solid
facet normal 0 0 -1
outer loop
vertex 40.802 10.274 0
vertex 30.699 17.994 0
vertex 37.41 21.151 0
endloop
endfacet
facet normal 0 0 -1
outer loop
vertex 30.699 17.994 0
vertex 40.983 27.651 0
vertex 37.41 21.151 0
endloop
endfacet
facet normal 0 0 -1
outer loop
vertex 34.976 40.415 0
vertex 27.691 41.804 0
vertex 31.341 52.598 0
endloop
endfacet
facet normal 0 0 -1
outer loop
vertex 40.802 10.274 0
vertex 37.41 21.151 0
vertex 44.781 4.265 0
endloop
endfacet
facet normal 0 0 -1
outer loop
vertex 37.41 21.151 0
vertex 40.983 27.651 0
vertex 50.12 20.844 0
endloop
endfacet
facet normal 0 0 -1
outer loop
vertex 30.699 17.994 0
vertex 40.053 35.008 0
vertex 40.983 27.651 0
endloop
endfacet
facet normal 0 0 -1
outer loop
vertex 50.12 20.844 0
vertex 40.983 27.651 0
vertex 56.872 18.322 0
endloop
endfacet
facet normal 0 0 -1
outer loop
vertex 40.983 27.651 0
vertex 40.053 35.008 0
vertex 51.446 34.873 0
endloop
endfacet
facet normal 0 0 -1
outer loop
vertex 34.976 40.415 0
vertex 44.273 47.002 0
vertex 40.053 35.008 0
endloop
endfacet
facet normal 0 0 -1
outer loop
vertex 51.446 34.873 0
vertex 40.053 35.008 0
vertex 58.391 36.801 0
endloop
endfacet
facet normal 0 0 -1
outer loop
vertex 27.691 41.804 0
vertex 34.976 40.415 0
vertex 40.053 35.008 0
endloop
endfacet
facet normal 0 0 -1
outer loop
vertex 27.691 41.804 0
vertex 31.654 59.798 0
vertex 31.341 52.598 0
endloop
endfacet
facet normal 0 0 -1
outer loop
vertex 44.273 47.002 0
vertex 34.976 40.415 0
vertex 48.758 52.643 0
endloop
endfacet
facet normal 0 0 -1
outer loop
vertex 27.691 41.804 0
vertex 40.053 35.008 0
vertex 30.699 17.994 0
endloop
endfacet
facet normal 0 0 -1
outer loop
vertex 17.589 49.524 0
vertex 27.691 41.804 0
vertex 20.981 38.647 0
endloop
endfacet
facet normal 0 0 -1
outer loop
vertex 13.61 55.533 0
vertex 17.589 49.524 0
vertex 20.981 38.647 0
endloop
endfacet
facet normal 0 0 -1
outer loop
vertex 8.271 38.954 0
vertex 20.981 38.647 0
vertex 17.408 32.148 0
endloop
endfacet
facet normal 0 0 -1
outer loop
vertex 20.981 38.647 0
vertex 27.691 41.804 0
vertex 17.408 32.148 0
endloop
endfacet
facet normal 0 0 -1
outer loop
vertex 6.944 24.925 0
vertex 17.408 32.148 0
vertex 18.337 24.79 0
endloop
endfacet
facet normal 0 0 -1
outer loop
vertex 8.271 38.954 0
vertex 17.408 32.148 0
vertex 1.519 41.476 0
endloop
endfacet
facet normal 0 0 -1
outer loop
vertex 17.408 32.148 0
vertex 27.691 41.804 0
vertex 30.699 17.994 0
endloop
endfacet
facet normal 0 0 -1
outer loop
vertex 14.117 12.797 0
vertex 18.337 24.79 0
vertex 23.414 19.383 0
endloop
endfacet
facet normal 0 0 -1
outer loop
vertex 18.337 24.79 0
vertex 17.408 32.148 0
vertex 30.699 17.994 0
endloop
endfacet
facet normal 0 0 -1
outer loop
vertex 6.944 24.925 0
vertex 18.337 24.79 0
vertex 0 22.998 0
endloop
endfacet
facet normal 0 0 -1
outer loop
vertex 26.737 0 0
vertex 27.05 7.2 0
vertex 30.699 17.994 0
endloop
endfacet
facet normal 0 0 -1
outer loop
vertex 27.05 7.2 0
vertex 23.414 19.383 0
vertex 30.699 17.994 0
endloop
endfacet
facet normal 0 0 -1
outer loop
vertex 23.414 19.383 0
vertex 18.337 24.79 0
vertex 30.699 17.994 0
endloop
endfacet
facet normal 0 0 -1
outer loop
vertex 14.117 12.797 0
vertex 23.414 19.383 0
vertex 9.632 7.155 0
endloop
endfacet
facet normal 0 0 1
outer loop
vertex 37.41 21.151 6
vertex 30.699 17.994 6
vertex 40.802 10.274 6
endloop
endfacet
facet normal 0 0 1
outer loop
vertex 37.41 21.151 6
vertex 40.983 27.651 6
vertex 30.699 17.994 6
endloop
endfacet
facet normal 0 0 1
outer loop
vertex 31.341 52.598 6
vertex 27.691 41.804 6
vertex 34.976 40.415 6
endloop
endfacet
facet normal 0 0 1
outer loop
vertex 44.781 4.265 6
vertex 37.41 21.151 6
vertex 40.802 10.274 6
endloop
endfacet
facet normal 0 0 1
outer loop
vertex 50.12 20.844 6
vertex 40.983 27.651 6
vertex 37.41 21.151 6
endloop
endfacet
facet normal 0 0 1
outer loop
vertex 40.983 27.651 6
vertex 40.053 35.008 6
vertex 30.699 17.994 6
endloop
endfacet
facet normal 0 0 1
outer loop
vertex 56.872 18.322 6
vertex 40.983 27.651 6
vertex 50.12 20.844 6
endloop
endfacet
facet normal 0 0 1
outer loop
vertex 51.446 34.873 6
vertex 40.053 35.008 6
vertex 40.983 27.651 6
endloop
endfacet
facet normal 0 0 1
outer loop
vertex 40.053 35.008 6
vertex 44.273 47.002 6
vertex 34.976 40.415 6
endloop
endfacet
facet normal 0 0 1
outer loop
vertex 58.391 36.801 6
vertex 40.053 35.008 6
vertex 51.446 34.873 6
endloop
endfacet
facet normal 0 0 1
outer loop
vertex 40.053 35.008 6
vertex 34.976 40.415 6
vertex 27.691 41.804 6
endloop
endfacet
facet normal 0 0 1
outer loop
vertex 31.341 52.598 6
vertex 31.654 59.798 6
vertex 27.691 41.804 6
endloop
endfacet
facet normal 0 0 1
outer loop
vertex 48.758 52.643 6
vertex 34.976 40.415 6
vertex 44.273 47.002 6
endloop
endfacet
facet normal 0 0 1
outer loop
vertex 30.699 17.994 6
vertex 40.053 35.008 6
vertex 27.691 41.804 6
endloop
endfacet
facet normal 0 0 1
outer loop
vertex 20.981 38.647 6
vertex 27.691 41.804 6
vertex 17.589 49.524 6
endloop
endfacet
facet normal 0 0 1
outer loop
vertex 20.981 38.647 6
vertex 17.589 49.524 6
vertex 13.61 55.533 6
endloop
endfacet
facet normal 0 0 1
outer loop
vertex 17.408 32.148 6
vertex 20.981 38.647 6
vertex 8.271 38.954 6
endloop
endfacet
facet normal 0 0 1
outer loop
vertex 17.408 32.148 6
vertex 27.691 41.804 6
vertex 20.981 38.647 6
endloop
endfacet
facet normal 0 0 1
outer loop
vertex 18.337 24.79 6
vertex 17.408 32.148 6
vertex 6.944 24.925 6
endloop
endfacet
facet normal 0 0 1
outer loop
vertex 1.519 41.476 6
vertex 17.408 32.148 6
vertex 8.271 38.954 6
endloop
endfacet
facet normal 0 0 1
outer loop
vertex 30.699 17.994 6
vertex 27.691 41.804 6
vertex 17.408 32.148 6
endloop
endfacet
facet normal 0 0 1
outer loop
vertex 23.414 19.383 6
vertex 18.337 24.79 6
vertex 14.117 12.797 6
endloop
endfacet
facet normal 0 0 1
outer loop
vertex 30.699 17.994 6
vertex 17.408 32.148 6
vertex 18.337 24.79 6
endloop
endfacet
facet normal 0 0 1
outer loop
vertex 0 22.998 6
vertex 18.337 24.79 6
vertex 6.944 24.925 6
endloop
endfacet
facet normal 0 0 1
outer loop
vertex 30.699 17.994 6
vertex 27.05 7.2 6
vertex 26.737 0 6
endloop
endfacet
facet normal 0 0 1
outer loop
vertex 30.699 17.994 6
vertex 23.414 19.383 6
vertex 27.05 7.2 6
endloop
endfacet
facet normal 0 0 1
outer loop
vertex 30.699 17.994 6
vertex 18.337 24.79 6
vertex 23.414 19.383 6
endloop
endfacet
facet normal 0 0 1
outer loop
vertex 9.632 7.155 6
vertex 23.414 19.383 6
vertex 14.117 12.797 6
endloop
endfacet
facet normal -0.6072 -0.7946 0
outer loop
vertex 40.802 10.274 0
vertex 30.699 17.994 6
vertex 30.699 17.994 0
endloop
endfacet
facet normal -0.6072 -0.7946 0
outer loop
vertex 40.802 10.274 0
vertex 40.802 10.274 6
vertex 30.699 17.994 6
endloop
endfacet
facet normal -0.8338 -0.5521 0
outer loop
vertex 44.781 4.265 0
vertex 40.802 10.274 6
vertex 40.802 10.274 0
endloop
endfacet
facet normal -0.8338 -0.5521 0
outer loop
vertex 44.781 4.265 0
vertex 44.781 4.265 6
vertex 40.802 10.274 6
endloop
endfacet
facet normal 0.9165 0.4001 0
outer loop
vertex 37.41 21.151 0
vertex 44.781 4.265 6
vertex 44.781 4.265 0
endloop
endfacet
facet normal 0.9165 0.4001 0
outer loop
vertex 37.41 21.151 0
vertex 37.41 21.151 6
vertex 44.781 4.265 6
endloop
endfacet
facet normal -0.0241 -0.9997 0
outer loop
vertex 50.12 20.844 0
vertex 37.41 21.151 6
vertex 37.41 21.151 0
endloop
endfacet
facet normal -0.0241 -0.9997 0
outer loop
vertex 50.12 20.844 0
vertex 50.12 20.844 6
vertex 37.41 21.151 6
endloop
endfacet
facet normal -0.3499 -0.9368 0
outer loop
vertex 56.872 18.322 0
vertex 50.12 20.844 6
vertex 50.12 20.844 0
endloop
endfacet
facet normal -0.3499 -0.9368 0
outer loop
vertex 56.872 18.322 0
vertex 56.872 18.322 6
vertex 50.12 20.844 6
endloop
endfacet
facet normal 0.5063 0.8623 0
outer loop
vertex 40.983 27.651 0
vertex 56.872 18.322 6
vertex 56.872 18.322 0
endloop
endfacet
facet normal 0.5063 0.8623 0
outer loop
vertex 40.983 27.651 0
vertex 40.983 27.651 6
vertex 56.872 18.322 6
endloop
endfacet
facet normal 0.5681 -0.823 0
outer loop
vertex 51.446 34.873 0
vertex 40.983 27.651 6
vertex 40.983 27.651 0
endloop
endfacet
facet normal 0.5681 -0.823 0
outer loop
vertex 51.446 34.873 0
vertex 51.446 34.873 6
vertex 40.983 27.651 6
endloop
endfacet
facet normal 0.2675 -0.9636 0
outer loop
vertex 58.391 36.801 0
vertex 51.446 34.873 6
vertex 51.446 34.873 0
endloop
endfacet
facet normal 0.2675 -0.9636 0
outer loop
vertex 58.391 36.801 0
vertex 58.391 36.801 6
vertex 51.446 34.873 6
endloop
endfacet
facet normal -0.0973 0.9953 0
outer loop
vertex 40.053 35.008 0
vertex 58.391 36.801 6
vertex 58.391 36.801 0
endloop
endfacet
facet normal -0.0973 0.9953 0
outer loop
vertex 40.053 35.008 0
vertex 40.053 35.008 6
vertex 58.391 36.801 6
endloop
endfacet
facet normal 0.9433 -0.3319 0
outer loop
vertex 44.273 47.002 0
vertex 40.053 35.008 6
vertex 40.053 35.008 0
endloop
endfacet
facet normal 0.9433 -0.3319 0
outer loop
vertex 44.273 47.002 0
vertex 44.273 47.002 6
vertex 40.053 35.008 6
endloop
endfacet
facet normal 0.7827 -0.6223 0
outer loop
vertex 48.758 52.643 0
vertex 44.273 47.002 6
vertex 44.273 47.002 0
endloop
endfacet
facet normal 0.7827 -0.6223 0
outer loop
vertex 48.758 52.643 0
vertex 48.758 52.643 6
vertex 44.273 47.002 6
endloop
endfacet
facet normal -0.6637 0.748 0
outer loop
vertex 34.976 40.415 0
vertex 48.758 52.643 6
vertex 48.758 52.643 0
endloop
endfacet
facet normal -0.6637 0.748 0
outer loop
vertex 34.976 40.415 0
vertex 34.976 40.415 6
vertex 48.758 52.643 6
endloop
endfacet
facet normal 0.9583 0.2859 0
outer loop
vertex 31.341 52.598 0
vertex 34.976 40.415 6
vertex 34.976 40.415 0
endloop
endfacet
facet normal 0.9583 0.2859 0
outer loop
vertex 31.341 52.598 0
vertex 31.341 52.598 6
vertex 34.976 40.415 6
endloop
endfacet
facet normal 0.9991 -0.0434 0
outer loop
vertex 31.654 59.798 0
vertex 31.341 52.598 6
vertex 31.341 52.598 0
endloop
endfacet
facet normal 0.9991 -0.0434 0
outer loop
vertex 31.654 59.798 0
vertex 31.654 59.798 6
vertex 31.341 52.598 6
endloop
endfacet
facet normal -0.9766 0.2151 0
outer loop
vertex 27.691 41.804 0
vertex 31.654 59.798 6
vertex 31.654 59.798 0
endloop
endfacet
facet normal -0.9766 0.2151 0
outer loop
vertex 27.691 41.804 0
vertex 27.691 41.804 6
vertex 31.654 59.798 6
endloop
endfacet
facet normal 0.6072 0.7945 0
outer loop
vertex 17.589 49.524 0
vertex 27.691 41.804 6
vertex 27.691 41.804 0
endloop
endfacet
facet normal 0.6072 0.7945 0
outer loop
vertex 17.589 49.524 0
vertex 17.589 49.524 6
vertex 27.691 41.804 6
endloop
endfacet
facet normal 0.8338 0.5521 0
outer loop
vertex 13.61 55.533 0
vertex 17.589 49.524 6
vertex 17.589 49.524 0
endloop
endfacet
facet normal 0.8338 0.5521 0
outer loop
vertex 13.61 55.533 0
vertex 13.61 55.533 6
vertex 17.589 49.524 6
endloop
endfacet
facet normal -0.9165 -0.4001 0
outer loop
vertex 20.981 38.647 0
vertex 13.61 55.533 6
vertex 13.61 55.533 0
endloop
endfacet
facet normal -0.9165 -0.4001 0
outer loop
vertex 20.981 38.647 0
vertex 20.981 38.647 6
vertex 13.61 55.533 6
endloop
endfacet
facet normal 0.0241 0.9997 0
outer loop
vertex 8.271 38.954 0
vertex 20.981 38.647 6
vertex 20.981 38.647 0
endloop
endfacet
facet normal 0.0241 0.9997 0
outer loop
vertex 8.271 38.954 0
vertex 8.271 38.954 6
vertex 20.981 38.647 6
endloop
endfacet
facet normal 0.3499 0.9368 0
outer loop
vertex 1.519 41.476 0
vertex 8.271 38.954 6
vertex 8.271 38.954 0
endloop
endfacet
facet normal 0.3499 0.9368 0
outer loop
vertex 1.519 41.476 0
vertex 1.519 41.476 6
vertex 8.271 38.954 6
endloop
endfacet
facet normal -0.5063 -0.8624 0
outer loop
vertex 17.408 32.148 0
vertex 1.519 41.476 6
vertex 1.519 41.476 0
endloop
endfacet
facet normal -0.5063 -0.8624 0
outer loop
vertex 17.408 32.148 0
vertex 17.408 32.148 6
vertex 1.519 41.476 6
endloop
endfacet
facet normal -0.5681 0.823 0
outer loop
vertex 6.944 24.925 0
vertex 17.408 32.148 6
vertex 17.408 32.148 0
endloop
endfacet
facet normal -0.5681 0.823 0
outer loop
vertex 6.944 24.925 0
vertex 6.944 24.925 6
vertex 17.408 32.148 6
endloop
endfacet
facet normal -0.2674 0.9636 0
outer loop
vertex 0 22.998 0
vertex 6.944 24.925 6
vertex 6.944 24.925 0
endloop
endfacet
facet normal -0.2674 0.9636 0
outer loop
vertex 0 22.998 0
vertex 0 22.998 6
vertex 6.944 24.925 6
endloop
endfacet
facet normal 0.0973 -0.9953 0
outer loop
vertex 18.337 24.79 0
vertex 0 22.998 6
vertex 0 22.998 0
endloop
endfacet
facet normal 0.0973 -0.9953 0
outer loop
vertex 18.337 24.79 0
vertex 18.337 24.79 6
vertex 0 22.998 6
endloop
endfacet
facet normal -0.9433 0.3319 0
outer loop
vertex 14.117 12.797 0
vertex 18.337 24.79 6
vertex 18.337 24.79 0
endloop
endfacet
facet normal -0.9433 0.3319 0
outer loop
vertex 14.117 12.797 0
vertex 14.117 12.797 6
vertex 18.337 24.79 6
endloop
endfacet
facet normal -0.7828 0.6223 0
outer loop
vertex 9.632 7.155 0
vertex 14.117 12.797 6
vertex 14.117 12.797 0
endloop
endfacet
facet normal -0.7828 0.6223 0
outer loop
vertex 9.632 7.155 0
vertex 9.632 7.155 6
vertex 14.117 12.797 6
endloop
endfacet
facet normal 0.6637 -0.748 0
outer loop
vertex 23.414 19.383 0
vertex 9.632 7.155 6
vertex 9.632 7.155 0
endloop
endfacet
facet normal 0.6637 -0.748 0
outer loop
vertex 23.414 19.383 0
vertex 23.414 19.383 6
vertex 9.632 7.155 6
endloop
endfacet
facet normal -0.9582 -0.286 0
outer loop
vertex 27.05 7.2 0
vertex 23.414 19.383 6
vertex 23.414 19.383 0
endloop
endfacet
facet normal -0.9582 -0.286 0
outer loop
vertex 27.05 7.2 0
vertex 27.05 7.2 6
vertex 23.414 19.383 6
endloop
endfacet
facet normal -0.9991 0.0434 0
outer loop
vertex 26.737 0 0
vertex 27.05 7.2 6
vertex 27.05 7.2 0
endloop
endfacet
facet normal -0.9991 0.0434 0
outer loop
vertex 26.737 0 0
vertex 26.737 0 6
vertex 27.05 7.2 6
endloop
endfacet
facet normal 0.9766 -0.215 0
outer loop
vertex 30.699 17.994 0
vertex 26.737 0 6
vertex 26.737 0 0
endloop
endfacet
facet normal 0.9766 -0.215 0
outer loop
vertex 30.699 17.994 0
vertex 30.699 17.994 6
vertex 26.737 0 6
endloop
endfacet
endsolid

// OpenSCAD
$fn = 32;

// ----------------------------------------------------------------------
// Fan rotor section: 10 blades, 12 mm hub radius, 18 mm blades
// ----------------------------------------------------------------------

// --- parameters (mm) ---
profile_height = 6;       // extrusion height
profile_points = 30;      // points of the closed outline

profile = [[40.983, 27.651], [51.446, 34.873], [58.391, 36.801], [40.053, 35.008], [44.273, 47.002], [48.758, 52.643], [34.976, 40.415], [31.341, 52.598], [31.654, 59.798], [27.691, 41.804], [17.589, 49.524], [13.61, 55.533], [20.981, 38.647], [8.271, 38.954], [1.519, 41.476], [17.408, 32.148], [6.944, 24.925], [0, 22.998], [18.337, 24.79], [14.117, 12.797], [9.632, 7.155], [23.414, 19.383], [27.05, 7.2], [26.737, 0], [30.699, 17.994], [40.802, 10.274], [44.781, 4.265], [37.41, 21.151], [50.12, 20.844], [56.872, 18.322]];  // single closed polygon, 30 points, counter clockwise

// --- the one profile operation ---
linear_extrude(height = profile_height) polygon(points = profile);
